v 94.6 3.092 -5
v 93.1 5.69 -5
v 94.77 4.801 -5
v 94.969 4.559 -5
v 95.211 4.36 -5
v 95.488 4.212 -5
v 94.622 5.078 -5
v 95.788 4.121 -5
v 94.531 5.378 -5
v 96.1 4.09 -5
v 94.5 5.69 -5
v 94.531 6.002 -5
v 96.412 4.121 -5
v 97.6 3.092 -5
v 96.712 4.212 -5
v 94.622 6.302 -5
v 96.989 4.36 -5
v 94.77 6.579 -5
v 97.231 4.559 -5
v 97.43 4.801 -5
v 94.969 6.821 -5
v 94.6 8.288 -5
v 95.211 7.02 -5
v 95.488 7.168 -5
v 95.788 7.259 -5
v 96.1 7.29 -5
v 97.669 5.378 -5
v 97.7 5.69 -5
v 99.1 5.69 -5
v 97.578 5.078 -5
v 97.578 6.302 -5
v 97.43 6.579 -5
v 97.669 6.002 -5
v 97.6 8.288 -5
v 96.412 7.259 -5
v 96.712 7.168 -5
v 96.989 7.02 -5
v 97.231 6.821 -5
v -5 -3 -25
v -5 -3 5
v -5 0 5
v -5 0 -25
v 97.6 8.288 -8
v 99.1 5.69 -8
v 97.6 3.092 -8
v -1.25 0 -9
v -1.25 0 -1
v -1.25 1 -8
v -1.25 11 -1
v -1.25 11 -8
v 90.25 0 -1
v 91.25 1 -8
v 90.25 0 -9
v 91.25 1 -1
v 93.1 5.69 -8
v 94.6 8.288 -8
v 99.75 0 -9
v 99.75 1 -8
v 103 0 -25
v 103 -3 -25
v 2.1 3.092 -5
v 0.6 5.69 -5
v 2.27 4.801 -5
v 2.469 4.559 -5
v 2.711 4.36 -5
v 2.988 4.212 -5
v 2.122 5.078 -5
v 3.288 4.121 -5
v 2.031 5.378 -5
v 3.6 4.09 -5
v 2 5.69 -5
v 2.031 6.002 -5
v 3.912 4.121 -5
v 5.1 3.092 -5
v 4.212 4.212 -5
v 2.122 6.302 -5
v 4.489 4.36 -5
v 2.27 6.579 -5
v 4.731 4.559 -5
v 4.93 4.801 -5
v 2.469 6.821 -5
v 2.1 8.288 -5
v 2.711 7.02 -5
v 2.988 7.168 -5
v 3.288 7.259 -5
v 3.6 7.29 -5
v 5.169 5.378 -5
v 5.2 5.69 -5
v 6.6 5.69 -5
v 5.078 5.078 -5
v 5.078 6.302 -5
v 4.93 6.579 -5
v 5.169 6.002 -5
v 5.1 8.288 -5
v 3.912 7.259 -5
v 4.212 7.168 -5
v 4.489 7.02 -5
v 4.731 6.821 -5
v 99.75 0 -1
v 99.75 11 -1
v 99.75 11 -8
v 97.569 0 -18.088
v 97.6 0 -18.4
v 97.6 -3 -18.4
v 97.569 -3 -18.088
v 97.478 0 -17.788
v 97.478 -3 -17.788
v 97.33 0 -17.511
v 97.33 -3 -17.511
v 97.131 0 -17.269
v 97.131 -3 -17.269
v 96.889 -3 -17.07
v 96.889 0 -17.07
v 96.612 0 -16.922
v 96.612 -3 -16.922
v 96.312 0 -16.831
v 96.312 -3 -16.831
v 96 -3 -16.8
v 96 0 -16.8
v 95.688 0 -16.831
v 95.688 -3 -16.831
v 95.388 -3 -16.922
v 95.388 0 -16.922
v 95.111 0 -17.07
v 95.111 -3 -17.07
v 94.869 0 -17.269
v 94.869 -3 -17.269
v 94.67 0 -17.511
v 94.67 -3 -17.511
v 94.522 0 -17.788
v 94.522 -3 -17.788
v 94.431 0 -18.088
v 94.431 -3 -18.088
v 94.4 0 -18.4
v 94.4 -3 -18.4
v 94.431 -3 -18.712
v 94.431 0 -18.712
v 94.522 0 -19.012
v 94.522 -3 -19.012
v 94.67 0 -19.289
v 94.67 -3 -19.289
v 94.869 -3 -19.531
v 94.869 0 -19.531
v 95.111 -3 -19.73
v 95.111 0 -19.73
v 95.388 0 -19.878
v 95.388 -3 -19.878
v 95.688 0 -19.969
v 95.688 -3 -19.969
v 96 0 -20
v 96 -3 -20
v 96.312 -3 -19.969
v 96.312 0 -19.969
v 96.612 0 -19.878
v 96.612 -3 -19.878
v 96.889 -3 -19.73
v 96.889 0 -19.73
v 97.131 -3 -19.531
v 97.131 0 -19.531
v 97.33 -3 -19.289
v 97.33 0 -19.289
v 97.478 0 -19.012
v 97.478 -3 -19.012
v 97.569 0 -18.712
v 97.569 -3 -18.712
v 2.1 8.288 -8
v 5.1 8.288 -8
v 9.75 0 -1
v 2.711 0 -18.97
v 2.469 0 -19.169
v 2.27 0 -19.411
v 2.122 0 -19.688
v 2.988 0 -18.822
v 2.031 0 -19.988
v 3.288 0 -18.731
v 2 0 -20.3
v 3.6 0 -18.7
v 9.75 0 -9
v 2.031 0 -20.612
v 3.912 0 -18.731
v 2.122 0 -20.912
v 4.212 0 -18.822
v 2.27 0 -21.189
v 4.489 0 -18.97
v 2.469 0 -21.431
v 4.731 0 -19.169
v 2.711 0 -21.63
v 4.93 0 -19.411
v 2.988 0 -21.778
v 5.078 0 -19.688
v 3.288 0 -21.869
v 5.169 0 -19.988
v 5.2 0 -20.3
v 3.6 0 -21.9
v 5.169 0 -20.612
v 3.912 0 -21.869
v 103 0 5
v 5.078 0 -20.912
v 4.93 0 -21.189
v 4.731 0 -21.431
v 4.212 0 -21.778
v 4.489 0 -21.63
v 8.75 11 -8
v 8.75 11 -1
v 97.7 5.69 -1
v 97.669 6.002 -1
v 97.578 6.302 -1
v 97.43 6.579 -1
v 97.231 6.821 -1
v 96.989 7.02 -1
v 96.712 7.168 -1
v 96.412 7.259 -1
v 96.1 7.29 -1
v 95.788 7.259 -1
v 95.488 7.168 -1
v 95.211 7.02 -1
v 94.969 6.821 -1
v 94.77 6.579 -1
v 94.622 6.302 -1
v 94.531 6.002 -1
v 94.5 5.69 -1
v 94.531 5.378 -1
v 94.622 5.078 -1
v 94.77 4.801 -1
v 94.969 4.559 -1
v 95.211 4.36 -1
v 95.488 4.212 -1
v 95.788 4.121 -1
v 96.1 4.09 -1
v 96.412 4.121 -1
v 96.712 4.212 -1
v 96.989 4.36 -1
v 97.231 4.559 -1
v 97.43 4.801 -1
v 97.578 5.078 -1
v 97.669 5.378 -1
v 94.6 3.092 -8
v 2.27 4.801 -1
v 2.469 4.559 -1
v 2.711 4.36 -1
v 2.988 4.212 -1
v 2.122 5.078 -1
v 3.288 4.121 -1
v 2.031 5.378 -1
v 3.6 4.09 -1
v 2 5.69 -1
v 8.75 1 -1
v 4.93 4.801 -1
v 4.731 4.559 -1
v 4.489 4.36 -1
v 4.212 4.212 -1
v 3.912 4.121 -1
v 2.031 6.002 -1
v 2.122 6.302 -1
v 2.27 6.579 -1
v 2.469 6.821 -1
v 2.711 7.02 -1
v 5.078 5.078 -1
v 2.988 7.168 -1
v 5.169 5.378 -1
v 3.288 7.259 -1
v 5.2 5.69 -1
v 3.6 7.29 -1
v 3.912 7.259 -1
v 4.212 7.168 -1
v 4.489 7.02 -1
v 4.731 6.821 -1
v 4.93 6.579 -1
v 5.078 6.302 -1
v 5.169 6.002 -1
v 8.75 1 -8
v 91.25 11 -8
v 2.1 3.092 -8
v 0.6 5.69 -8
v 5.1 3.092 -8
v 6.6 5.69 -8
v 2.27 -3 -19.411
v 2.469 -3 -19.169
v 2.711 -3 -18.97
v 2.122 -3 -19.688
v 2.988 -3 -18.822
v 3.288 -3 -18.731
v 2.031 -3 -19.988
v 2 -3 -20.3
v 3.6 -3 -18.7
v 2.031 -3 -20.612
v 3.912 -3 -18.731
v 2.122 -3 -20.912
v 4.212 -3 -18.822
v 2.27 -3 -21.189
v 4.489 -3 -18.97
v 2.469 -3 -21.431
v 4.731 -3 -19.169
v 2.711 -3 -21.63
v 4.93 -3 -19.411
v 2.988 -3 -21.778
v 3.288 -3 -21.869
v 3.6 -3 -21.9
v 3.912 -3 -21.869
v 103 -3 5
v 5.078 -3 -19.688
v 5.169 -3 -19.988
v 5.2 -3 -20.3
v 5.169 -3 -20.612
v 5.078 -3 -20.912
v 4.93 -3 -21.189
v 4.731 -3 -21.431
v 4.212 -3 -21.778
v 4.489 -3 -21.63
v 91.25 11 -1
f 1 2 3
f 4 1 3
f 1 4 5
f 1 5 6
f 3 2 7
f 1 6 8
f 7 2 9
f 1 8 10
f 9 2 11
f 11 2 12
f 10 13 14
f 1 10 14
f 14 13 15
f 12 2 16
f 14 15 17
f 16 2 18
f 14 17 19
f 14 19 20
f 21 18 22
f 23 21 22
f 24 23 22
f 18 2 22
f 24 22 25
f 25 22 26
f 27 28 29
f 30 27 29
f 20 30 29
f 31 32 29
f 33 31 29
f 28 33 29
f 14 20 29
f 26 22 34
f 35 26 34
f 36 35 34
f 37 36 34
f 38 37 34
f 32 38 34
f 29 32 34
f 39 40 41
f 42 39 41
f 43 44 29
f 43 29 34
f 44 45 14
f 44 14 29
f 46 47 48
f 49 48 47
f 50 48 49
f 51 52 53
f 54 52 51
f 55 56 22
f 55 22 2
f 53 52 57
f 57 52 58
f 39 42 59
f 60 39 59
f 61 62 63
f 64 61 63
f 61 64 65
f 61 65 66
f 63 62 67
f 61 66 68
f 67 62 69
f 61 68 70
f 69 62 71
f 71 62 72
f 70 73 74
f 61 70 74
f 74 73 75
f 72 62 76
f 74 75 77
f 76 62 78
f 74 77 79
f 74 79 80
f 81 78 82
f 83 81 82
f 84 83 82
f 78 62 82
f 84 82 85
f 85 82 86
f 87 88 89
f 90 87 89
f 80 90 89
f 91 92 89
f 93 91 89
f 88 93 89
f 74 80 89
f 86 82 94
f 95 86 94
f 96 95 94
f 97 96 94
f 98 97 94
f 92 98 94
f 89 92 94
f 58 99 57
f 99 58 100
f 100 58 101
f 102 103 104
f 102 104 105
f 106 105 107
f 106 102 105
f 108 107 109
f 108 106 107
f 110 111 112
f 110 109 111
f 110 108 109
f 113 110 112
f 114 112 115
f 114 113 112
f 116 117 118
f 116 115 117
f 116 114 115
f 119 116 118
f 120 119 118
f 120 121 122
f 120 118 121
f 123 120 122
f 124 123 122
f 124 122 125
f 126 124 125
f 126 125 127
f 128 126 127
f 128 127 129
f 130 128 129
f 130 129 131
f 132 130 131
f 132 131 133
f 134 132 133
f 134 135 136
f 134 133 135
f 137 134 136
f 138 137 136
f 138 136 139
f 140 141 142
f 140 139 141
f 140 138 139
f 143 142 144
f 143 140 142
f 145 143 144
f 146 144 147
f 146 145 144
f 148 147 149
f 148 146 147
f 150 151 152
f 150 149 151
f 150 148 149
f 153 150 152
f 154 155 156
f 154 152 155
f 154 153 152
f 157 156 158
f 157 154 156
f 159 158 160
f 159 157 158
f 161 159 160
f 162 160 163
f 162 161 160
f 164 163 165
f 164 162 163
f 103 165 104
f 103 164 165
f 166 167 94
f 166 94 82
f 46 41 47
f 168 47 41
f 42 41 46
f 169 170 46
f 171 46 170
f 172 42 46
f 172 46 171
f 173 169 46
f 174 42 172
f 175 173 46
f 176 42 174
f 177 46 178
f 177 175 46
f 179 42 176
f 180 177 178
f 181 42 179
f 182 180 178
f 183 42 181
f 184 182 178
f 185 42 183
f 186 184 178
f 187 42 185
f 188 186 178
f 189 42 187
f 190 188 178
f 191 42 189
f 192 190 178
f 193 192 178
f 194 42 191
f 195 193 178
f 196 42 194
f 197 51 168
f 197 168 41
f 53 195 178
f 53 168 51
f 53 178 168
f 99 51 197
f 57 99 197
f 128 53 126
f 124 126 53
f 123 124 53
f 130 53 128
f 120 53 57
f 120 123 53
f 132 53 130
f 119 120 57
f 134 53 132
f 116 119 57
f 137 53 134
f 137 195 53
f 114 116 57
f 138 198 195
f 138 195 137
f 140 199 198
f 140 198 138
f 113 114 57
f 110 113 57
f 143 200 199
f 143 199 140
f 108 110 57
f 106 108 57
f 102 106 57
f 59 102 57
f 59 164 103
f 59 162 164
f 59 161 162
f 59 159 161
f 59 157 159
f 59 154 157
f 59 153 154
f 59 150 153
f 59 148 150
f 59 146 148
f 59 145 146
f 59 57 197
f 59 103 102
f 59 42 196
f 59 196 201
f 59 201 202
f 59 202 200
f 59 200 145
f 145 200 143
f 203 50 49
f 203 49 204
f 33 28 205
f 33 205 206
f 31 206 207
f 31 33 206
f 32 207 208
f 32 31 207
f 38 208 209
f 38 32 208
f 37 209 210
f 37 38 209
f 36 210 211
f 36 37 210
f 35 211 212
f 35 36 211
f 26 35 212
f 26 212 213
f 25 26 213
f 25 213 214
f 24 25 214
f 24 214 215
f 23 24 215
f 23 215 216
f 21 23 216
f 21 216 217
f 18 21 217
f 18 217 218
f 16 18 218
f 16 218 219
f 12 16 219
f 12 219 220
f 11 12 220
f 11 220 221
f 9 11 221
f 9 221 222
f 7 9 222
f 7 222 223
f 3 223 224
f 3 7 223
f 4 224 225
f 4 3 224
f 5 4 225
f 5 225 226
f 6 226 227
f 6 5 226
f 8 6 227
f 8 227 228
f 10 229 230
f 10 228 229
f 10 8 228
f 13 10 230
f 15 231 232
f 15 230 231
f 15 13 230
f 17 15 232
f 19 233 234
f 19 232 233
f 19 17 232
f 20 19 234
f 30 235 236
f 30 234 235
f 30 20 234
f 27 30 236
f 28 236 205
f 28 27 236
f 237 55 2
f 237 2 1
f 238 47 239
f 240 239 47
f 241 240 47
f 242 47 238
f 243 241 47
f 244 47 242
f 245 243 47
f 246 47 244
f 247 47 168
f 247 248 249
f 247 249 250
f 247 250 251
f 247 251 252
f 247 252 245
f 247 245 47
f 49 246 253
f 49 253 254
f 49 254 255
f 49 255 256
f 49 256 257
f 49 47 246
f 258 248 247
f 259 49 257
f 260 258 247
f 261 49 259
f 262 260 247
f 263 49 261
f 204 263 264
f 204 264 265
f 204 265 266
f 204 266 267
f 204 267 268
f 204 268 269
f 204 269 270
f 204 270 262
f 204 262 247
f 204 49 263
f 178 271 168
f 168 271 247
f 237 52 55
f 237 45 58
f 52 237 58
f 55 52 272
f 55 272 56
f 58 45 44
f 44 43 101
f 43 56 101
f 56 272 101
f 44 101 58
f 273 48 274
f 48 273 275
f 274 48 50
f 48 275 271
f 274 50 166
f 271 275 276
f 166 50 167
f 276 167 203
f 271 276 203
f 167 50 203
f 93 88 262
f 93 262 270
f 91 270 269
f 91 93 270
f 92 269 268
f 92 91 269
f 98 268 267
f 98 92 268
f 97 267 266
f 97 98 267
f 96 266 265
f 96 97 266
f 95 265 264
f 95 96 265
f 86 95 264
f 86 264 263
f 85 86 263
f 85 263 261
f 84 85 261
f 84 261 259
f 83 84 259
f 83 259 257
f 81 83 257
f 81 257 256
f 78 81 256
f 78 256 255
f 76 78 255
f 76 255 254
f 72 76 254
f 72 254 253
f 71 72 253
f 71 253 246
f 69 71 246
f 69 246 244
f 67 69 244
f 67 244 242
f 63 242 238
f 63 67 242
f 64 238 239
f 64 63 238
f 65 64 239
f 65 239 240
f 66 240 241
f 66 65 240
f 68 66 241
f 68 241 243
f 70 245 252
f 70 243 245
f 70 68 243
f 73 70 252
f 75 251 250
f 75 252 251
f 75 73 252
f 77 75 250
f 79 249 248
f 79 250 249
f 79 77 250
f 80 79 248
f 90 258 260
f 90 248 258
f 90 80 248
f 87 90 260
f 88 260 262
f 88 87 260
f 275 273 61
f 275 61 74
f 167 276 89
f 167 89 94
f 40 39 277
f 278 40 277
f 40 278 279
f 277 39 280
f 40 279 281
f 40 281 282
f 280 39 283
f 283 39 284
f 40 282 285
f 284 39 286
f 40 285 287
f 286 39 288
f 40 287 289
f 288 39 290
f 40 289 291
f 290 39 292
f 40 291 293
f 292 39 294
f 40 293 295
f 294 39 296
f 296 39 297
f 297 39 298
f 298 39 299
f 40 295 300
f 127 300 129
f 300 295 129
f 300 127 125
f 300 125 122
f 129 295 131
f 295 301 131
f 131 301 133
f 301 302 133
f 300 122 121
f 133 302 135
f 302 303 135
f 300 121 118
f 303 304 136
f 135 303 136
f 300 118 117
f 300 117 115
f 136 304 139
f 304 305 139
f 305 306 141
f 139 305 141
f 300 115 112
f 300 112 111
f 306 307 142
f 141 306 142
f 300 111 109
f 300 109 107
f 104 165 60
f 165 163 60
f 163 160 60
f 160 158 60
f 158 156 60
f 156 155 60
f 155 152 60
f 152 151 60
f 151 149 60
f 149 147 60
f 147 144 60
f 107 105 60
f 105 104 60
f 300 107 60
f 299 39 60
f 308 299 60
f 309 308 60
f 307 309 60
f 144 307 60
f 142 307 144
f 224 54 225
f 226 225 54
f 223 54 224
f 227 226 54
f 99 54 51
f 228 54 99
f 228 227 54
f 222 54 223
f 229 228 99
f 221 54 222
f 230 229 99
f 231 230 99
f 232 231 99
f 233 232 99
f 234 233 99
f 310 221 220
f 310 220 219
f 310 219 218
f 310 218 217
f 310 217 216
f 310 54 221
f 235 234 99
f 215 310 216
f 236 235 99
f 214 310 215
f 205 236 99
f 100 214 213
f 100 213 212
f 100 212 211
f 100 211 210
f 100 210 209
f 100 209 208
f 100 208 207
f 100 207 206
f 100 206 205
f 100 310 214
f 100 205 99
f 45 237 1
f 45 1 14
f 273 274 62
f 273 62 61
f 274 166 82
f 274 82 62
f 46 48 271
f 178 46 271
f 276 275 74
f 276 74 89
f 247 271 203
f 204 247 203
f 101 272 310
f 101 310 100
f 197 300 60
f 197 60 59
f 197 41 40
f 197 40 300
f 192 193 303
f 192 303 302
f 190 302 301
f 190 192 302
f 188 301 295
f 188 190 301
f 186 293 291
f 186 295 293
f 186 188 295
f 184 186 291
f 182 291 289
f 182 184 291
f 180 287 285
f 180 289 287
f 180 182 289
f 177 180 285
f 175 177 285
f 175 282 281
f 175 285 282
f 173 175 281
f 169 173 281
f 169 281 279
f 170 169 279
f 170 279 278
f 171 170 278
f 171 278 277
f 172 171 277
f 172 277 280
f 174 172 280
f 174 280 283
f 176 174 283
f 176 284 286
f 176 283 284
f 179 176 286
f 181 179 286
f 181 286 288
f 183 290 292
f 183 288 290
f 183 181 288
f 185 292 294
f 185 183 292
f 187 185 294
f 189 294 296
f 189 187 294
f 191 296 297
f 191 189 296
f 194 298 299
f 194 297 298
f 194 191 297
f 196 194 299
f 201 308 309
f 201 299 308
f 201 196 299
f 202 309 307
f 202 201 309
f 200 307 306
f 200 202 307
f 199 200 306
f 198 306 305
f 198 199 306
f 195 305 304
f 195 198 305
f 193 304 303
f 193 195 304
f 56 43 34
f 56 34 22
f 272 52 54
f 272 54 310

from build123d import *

# Parameters (mm, degrees)
CYLINDER030_R          = 1.6
CYLINDER030_DEPTH      = 12
CYLINDER018_R          = 1.6
CYLINDER018_DEPTH      = 12
PRISM001_DEPTH         = 3
BOX021_W               = 8.5
BOX021_H               = 11
BOX021_DEPTH           = 7
CYLINDER029_R          = 1.6
CYLINDER029_DEPTH      = 10
CYLINDER029_ROLL_ANGLE = 90
CYLINDER016_R          = 1.6
CYLINDER016_DEPTH      = 10
CYLINDER016_ROLL_ANGLE = 90
BOX004_W               = 108
BOX004_H               = 3
BOX004_DEPTH           = 30
CYLINDER014_R          = 1.6
CYLINDER014_DEPTH      = 16
CYLINDER014_ROLL_ANGLE = 90
PRISM_DEPTH            = 3
BOX020_W               = 10
BOX020_H               = 11
BOX020_DEPTH           = 7
CHAMFER004_SIZE        = 1


with BuildPart() as cylinder030:
    # Cylinder030 → Cylinder030 (new body)
    with BuildSketch(Plane(origin=(3.6, 5.69, -7), x_dir=(1, 0, 0), z_dir=(0, 0, 1))):
        Circle(CYLINDER030_R)
    extrude(amount=CYLINDER030_DEPTH)


with BuildPart() as cylinder018:
    # Cylinder018 → Cylinder018 (new body)
    with BuildSketch(Plane(origin=(3.6, 5.69, -7), x_dir=(1, 0, 0), z_dir=(0, 0, 1))):
        Circle(CYLINDER018_R)
    extrude(amount=CYLINDER018_DEPTH)


with BuildPart() as prism001:
    # Prism001 → Prism001 (new body)
    with BuildSketch(Plane(origin=(3.6, 5.69, -7), x_dir=(1, 0, 0), z_dir=(0, 0, 1))):
        Polygon((3, 0), (1.5, 2.598076), (-1.5, 2.598076), (-3, 0), (-1.5, -2.598076), (1.5, -2.598076), align=None)
    extrude(amount=PRISM001_DEPTH)


with BuildPart() as cut008:
    # Box021 → Box021 (new body)
    with BuildSketch(Plane(origin=(-1.25, 0, -7), x_dir=(1, 0, 0), z_dir=(0, 0, 1))):
        with Locations((4.25, 5.5)):
            Rectangle(BOX021_W, BOX021_H)
    extrude(amount=BOX021_DEPTH)

    # Cut007: cut Prism001
    add(prism001.part, mode=Mode.SUBTRACT)


with BuildPart() as cut008_1:
    # Cut007 placement: moved
    add(cut008.part.moved(Location((0, 0, -1))))

    # Cut008: cut Cylinder018
    add(cylinder018.part, mode=Mode.SUBTRACT)


with BuildPart() as cut008_2:
    # Cut008 placement: moved
    add(cut008_1.part.moved(Location((92.5, 0, 0))))


with BuildPart() as cylinder029:
    # Cylinder029 → Cylinder029 (new body)
    with BuildSketch(Plane.XY):
        Circle(CYLINDER029_R)
    extrude(amount=CYLINDER029_DEPTH)


with BuildPart() as cylinder029_1:
    # Cylinder029 roll: moved
    add(cylinder029.part.rotate(Axis((0, 0, 0), (1, 0, 0)), CYLINDER029_ROLL_ANGLE))


with BuildPart() as cylinder029_2:
    # Cylinder029 placement: moved
    add(cylinder029_1.part.moved(Location((3.6, 5.69, -20.3))))


with BuildPart() as fusion010:
    # Cylinder016 → Cylinder016 (new body)
    with BuildSketch(Plane.XY):
        Circle(CYLINDER016_R)
    extrude(amount=CYLINDER016_DEPTH)


with BuildPart() as fusion010_1:
    # Cylinder016 roll: moved
    add(fusion010.part.rotate(Axis((0, 0, 0), (1, 0, 0)), CYLINDER016_ROLL_ANGLE))


with BuildPart() as fusion010_2:
    # Cylinder016 placement: moved
    add(fusion010_1.part.moved(Location((96, 5.69, -18.4))))

    # Fusion010: union Cylinder029
    add(cylinder029_2.part)


with BuildPart() as right_with_holes:
    # Box004 → Box004 (new body)
    with BuildSketch(Plane(origin=(-5, -3, -25), x_dir=(1, 0, 0), z_dir=(0, 0, 1))):
        with Locations((54, 1.5)):
            Rectangle(BOX004_W, BOX004_H)
    extrude(amount=BOX004_DEPTH)

    # Cut028: cut Fusion010
    add(fusion010_2.part, mode=Mode.SUBTRACT)


with BuildPart() as cylinder014:
    # Cylinder014 → Cylinder014 (new body)
    with BuildSketch(Plane.XY):
        Circle(CYLINDER014_R)
    extrude(amount=CYLINDER014_DEPTH)


with BuildPart() as cylinder014_1:
    # Cylinder014 roll: moved
    add(cylinder014.part.rotate(Axis((0, 0, 0), (1, 0, 0)), CYLINDER014_ROLL_ANGLE))


with BuildPart() as cylinder014_2:
    # Cylinder014 placement: moved
    add(cylinder014_1.part.moved(Location((3.6, 5.69, -20.3))))


with BuildPart() as prism:
    # Prism → Prism (new body)
    with BuildSketch(Plane(origin=(3.6, 5.69, -7), x_dir=(1, 0, 0), z_dir=(0, 0, 1))):
        Polygon((3, 0), (1.5, 2.598076), (-1.5, 2.598076), (-3, 0), (-1.5, -2.598076), (1.5, -2.598076), align=None)
    extrude(amount=PRISM_DEPTH)


with BuildPart() as right_side_final:
    # Box020 → Box020 (new body)
    with BuildSketch(Plane(origin=(-1.25, 0, -7), x_dir=(1, 0, 0), z_dir=(0, 0, 1))):
        with Locations((5, 5.5)):
            Rectangle(BOX020_W, BOX020_H)
    extrude(amount=BOX020_DEPTH)

    # Cut005: cut Prism
    add(prism.part, mode=Mode.SUBTRACT)


with BuildPart() as right_side_final_1:
    # Cut005 placement: moved
    add(right_side_final.part.moved(Location((0, 0, -1))))

    # Cut006: cut Cylinder014
    add(cylinder014_2.part, mode=Mode.SUBTRACT)

    # Fusion011: union Cut008, right with holes
    add(cut008_2.part)
    add(right_with_holes.part)

    # Chamfer004
    chamfer004_edges = [right_side_final_1.edges().sort_by_distance(p)[0] for p in [
        (95.5, 0, -8),
        (91.25, 0, -4.5),
        (8.75, 0, -4.5),
        (3.75, 0, -8),
    ]]
    chamfer(chamfer004_edges, length=CHAMFER004_SIZE)

    # Cut029: cut Cylinder030
    add(cylinder030.part, mode=Mode.SUBTRACT)


solid = right_side_final_1.part
